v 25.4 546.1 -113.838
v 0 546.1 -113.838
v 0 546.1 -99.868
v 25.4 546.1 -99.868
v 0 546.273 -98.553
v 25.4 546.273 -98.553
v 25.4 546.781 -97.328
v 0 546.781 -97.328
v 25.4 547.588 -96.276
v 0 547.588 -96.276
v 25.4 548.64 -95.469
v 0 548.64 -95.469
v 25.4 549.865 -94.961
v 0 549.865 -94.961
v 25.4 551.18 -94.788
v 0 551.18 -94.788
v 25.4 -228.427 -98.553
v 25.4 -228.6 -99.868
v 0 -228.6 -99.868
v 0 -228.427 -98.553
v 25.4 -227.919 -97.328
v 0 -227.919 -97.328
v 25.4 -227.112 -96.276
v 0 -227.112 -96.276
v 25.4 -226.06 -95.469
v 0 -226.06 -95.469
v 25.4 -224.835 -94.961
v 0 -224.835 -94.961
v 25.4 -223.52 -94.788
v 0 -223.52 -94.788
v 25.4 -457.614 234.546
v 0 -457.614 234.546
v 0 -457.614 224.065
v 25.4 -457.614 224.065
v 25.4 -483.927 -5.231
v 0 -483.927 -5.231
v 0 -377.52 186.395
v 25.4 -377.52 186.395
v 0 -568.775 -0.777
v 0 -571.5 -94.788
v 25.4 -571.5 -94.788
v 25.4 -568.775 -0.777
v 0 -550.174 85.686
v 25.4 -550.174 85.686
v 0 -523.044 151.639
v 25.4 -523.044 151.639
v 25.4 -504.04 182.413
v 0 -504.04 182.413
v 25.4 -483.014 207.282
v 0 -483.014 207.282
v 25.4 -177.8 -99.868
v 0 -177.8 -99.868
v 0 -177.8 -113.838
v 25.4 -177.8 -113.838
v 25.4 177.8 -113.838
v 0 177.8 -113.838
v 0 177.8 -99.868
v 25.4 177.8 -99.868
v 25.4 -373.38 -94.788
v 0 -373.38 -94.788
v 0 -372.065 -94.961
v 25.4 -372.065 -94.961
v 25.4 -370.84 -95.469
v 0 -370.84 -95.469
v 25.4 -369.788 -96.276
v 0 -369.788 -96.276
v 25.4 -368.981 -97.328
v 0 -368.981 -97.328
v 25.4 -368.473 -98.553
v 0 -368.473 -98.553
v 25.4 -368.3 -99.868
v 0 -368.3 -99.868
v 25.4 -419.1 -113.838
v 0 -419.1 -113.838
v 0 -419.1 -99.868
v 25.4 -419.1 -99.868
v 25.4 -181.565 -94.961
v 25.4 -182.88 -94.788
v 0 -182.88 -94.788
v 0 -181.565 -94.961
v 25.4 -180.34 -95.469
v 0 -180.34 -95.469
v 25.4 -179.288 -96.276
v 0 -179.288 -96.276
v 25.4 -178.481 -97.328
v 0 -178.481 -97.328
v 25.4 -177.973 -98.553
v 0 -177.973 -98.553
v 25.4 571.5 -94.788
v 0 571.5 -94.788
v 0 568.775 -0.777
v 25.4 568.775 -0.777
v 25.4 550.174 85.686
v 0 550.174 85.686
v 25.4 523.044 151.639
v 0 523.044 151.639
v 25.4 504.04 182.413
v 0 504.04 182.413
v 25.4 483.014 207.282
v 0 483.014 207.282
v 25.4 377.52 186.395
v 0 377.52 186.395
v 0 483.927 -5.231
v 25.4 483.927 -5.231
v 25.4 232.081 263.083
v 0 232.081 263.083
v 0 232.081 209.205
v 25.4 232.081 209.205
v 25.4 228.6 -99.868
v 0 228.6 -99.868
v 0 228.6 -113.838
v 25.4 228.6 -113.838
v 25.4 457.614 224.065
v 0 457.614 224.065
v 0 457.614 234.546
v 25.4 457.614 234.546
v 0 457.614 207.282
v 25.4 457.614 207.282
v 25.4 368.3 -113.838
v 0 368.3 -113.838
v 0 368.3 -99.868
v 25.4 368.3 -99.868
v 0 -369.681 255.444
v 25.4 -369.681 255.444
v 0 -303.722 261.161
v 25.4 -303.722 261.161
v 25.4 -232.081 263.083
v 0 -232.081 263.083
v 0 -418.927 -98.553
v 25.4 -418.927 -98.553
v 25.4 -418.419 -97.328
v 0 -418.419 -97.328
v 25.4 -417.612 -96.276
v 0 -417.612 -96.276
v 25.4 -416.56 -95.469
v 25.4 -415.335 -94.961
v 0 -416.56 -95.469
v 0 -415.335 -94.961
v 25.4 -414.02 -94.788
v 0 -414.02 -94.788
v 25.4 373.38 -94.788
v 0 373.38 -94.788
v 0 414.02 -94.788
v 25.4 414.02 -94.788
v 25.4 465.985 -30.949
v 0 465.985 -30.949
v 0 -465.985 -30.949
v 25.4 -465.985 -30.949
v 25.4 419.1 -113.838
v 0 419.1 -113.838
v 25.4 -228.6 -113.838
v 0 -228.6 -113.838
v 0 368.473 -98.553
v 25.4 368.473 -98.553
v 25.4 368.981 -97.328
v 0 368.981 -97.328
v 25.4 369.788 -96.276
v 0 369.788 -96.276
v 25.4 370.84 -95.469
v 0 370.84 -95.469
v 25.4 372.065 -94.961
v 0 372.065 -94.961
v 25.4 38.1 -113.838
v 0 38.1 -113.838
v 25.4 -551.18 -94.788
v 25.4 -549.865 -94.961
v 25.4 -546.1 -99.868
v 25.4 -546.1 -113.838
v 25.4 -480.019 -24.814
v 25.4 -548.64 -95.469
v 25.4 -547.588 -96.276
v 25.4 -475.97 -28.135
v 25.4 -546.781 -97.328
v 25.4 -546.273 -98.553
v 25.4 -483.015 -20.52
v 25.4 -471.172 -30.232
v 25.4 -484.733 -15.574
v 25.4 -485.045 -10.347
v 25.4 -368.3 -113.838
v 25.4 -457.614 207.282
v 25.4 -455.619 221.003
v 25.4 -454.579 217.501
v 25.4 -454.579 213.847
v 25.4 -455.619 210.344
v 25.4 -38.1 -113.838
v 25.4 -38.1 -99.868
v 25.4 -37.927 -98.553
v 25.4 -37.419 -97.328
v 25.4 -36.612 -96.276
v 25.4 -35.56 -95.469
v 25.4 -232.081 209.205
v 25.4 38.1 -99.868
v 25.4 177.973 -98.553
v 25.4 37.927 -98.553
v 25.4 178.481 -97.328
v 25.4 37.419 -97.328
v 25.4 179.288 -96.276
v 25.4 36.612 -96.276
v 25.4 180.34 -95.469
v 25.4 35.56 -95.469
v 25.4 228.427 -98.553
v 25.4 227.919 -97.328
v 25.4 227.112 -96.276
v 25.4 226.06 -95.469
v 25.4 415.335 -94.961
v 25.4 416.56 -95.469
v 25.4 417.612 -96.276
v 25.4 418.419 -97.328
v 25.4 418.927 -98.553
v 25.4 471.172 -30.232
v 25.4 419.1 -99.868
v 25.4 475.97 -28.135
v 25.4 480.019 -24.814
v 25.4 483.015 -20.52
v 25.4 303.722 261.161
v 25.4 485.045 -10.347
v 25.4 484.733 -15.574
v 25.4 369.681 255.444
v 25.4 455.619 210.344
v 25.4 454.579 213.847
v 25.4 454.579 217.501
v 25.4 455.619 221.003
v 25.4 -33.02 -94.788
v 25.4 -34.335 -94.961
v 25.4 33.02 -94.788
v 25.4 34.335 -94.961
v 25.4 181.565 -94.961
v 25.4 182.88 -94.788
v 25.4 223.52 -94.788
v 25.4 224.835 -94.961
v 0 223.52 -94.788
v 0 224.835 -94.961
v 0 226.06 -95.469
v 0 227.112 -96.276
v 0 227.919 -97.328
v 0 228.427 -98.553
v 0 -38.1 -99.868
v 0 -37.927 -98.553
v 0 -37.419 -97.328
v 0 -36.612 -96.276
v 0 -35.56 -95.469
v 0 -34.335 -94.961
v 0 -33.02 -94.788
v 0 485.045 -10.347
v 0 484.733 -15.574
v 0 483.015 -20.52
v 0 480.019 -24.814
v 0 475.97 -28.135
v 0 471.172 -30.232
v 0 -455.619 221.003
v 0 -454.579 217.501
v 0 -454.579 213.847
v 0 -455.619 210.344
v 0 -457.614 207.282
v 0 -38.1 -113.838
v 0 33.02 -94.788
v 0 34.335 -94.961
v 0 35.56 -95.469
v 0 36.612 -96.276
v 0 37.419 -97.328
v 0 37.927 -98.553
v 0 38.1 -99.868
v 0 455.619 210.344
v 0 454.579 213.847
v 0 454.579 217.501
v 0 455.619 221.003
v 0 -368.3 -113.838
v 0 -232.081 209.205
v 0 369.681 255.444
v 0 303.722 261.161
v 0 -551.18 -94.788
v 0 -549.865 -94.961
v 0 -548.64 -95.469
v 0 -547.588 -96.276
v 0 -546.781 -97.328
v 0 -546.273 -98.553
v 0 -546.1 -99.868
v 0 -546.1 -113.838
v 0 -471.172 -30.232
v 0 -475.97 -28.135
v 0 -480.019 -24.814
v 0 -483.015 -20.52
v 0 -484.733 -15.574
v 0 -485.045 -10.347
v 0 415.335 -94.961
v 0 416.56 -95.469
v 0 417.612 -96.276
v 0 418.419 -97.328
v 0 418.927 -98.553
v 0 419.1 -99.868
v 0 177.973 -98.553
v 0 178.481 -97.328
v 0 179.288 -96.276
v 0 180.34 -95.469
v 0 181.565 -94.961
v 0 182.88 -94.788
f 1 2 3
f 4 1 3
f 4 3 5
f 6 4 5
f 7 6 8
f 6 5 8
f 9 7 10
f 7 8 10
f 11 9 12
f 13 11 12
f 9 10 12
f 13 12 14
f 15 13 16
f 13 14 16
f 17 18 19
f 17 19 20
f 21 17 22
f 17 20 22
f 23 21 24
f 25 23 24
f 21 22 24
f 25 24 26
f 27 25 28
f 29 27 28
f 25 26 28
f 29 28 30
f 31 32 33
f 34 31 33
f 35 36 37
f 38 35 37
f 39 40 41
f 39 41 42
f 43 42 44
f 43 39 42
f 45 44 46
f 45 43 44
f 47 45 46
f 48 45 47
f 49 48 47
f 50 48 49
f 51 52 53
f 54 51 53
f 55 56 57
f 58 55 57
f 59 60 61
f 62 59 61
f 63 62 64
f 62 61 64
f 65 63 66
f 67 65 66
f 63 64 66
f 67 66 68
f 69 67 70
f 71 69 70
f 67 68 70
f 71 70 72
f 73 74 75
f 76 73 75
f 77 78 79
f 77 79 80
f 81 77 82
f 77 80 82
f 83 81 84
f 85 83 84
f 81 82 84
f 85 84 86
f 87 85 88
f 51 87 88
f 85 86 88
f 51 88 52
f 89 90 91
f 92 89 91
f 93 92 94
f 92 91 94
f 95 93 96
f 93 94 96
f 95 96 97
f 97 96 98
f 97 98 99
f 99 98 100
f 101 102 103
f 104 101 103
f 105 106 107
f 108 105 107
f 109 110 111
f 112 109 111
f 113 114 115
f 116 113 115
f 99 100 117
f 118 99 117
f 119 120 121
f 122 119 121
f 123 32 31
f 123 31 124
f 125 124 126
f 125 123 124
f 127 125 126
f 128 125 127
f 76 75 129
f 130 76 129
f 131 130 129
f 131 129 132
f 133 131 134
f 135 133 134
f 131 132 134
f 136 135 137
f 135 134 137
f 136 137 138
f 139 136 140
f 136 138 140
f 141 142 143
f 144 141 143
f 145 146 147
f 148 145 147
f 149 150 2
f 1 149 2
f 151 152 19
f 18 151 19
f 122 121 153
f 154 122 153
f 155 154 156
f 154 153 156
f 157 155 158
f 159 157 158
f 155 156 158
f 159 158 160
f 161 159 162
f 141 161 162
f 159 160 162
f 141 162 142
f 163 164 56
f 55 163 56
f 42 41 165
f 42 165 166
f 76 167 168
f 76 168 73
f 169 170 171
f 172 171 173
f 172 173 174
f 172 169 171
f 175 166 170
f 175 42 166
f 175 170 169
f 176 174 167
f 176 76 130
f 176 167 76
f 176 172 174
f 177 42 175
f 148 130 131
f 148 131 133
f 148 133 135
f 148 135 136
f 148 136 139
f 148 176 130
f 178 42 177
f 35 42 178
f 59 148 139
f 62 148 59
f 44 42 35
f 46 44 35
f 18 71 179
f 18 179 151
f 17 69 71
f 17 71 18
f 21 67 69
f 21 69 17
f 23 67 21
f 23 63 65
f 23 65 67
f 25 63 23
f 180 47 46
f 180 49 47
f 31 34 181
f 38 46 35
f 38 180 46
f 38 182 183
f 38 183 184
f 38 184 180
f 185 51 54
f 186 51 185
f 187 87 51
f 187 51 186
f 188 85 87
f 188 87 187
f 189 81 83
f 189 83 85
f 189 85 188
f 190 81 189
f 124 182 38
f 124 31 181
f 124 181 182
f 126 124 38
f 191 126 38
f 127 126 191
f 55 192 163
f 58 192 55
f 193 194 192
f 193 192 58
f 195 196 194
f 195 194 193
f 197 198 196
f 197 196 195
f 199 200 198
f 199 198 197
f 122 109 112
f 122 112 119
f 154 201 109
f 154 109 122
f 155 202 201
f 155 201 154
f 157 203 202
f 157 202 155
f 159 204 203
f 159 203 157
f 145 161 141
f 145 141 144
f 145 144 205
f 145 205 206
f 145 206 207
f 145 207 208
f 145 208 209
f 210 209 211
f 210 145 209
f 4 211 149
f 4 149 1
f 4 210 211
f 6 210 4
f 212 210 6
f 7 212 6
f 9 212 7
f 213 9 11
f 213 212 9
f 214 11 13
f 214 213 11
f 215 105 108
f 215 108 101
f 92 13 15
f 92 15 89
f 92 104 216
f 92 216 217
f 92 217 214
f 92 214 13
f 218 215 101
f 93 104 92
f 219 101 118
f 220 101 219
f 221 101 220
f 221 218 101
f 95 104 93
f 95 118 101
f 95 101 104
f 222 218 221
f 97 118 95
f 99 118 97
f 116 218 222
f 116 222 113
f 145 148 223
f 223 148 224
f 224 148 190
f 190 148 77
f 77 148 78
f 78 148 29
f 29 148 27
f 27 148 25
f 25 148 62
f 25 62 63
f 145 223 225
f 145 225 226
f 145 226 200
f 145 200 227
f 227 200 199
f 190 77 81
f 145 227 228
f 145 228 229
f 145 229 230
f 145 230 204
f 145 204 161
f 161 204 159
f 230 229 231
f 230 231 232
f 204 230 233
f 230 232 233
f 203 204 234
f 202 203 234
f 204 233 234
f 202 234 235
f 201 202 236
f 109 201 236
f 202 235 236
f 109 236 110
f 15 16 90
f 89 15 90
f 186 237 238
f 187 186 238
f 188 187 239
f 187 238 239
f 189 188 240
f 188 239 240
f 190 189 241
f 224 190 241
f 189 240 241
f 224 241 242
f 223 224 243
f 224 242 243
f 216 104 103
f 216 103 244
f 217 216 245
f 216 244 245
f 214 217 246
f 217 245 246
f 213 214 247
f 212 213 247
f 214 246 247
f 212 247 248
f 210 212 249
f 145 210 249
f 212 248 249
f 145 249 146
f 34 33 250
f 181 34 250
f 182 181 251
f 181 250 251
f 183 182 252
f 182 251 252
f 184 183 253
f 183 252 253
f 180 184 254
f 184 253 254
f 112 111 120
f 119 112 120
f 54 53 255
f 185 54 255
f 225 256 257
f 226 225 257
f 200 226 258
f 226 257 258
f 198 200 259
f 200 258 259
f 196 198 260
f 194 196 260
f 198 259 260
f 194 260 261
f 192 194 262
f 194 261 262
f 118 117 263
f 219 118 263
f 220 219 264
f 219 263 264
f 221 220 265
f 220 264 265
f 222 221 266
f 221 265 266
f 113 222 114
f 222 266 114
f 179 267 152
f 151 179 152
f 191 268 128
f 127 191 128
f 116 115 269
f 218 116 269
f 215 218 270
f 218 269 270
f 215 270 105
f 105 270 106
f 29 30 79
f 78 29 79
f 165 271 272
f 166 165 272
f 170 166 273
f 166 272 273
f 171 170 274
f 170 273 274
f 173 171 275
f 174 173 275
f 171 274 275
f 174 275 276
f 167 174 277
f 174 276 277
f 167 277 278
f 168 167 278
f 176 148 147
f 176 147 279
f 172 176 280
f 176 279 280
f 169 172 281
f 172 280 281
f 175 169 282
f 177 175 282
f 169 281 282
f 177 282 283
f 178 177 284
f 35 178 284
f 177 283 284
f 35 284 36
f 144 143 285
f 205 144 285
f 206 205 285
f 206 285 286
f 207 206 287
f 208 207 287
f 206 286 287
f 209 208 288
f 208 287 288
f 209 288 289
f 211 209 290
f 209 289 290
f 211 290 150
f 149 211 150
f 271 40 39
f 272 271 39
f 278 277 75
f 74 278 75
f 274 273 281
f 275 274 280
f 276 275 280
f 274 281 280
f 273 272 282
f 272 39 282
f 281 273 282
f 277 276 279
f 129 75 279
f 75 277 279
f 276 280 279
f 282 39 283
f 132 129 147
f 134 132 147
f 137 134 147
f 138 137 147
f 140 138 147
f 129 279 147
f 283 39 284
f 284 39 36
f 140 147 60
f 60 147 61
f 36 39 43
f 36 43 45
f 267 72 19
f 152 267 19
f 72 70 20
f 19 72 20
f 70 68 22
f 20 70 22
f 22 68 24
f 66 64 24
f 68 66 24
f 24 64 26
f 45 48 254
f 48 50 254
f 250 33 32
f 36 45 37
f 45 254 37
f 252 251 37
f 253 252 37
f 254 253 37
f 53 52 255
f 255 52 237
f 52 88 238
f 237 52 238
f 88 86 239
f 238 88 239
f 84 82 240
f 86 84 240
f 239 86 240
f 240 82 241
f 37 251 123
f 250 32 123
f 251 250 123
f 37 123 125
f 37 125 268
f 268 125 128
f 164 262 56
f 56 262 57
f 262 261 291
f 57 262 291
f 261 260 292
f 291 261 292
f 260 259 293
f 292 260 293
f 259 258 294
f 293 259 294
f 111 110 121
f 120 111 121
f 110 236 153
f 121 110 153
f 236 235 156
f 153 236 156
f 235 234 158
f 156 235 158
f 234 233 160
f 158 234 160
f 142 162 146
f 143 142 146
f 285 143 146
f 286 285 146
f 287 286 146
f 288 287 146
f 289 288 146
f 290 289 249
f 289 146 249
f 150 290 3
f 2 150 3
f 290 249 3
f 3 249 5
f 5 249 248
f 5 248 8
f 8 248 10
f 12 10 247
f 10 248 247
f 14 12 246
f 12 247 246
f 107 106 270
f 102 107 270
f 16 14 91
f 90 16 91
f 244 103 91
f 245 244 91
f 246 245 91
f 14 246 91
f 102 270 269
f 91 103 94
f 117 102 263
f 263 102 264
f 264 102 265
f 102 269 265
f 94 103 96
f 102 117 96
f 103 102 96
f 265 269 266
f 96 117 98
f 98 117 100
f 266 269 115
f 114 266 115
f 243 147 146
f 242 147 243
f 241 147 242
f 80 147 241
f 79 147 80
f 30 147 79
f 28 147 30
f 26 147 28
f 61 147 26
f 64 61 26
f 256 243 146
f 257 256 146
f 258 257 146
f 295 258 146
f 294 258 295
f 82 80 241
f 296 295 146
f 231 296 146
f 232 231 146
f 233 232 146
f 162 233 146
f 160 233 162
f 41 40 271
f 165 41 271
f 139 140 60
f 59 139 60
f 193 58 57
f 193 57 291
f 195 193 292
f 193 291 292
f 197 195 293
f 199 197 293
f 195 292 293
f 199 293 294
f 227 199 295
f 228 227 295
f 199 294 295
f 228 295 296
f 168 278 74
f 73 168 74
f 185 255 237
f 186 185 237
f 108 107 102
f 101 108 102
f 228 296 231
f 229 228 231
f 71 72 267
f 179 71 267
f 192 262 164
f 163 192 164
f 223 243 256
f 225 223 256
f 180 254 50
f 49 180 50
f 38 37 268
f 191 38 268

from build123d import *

# Parameters (mm, degrees)
F1_DEPTH = 25.4


with BuildPart() as f1:
    # F0 (on Right) → F1 (new body)
    with BuildSketch(Plane.YZ):
        with BuildLine():
            Line((-33.02, -94.7882861604), (0, -94.7882861604))
            Line((0, -94.7882861604), (33.02, -94.7882861604))
            ThreePointArc((33.02, -94.7882861604), (36.6121024484, -96.276183712), (38.1, -99.8682861604))
            Line((38.1, -99.8682861604), (38.1, -113.8382861604))
            Line((38.1, -113.8382861604), (177.8, -113.8382861604))
            Line((177.8, -113.8382861604), (177.8, -99.8682861604))
            ThreePointArc((177.8, -99.8682861604), (179.2878975516, -96.276183712), (182.88, -94.7882861604))
            Line((182.88, -94.7882861604), (223.52, -94.7882861604))
            ThreePointArc((223.52, -94.7882861604), (227.1121024484, -96.276183712), (228.6, -99.8682861604))
            Line((228.6, -99.8682861604), (228.6, -113.8382861604))
            Line((228.6, -113.8382861604), (368.3, -113.8382861604))
            Line((368.3, -113.8382861604), (368.3, -99.8682861604))
            ThreePointArc((368.3, -99.8682861604), (369.7878975516, -96.276183712), (373.38, -94.7882861604))
            Line((373.38, -94.7882861604), (414.02, -94.7882861604))
            ThreePointArc((414.02, -94.7882861604), (417.6121024484, -96.276183712), (419.1, -99.8682861604))
            Line((419.1, -99.8682861604), (419.1, -113.8382861604))
            Line((419.1, -113.8382861604), (546.1, -113.8382861604))
            Line((546.1, -113.8382861604), (546.1, -99.8682861604))
            ThreePointArc((546.1, -99.8682861604), (547.5878975516, -96.276183712), (551.18, -94.7882861604))
            Line((551.18, -94.7882861604), (571.5, -94.7882861604))
            add(Edge.make_bspline(
                [(571.5, -94.7882861604), (572.9916402115, -51.8796445459), (572.0651404012, 35.9396927338), (525.960624218, 164.5377278328), (483.0139090485, 207.2824090719)],
                knots=[0, 0, 0, 0, 0.455226695, 1, 1, 1, 1], degree=3))
            Line((483.0139090485, 207.2824090719), (457.6139090485, 207.2824090719))
            ThreePointArc((457.6139090485, 207.2824090719), (454.4468485925, 215.6736583026), (457.6139090485, 224.0649075333))
            Line((457.6139090485, 224.0649075333), (457.6139090485, 234.5455965156))
            add(Edge.make_bspline(
                [(457.6139090485, 234.5455965156), (430.2923400603, 242.6197356959), (367.9016901724, 260.6701177346), (280.7948912625, 262.2175910558), (232.0806728363, 263.0830109119)],
                knots=[0.0166181854, 0.0166181854, 0.0166181854, 0.0166181854, 0.4500466426, 1, 1, 1, 1], degree=3))
            Line((232.0806728363, 263.0830109119), (232.0806728363, 209.2051863447))
            Line((232.0806728363, 209.2051863447), (377.5198757648, 186.3945573568))
            Line((377.5198757648, 186.3945573568), (483.9270131228, -5.2314990347))
            ThreePointArc((483.9270131228, -5.2314990347), (481.6642820093, -22.7701705112), (465.9854230078, -30.9493104209))
            Line((465.9854230078, -30.9493104209), (0, -30.9493104209))
            Line((0, -30.9493104209), (-465.9854230078, -30.9493104209))
            ThreePointArc((-465.9854230078, -30.9493104209), (-481.6642820093, -22.7701705112), (-483.9270131228, -5.2314990347))
            Line((-483.9270131228, -5.2314990347), (-377.5198757648, 186.3945573568))
            Line((-377.5198757648, 186.3945573568), (-232.0806728363, 209.2051863447))
            Line((-232.0806728363, 209.2051863447), (-232.0806728363, 263.0830109119))
            add(Edge.make_bspline(
                [(-457.6139090485, 234.5455965156), (-430.2923400603, 242.6197356959), (-367.9016901724, 260.6701177346), (-280.7948912625, 262.2175910558), (-232.0806728363, 263.0830109119)],
                knots=[0.0166181854, 0.0166181854, 0.0166181854, 0.0166181854, 0.4500466426, 1, 1, 1, 1], degree=3))
            Line((-457.6139090485, 234.5455965156), (-457.6139090485, 224.0649075333))
            ThreePointArc((-457.6139090485, 224.0649075333), (-454.4468485925, 215.6736583026), (-457.6139090485, 207.2824090719))
            Line((-457.6139090485, 207.2824090719), (-483.0139090485, 207.2824090719))
            add(Edge.make_bspline(
                [(-571.5, -94.7882861604), (-572.9916402115, -51.8796445459), (-572.0651404012, 35.9396927338), (-525.960624218, 164.5377278328), (-483.0139090485, 207.2824090719)],
                knots=[0, 0, 0, 0, 0.455226695, 1, 1, 1, 1], degree=3))
            Line((-571.5, -94.7882861604), (-551.18, -94.7882861604))
            ThreePointArc((-551.18, -94.7882861604), (-547.5878975516, -96.276183712), (-546.1, -99.8682861604))
            Line((-546.1, -99.8682861604), (-546.1, -113.8382861604))
            Line((-546.1, -113.8382861604), (-419.1, -113.8382861604))
            Line((-419.1, -113.8382861604), (-419.1, -99.8682861604))
            ThreePointArc((-419.1, -99.8682861604), (-417.6121024484, -96.276183712), (-414.02, -94.7882861604))
            Line((-414.02, -94.7882861604), (-373.38, -94.7882861604))
            ThreePointArc((-373.38, -94.7882861604), (-369.7878975516, -96.276183712), (-368.3, -99.8682861604))
            Line((-368.3, -99.8682861604), (-368.3, -113.8382861604))
            Line((-368.3, -113.8382861604), (-228.6, -113.8382861604))
            Line((-228.6, -113.8382861604), (-228.6, -99.8682861604))
            ThreePointArc((-228.6, -99.8682861604), (-227.1121024484, -96.276183712), (-223.52, -94.7882861604))
            Line((-223.52, -94.7882861604), (-182.88, -94.7882861604))
            ThreePointArc((-182.88, -94.7882861604), (-179.2878975516, -96.276183712), (-177.8, -99.8682861604))
            Line((-177.8, -99.8682861604), (-177.8, -113.8382861604))
            Line((-177.8, -113.8382861604), (-38.1, -113.8382861604))
            Line((-38.1, -113.8382861604), (-38.1, -99.8682861604))
            ThreePointArc((-38.1, -99.8682861604), (-36.6121024484, -96.276183712), (-33.02, -94.7882861604))
        make_face()
    extrude(amount=F1_DEPTH)


solid = f1.part
